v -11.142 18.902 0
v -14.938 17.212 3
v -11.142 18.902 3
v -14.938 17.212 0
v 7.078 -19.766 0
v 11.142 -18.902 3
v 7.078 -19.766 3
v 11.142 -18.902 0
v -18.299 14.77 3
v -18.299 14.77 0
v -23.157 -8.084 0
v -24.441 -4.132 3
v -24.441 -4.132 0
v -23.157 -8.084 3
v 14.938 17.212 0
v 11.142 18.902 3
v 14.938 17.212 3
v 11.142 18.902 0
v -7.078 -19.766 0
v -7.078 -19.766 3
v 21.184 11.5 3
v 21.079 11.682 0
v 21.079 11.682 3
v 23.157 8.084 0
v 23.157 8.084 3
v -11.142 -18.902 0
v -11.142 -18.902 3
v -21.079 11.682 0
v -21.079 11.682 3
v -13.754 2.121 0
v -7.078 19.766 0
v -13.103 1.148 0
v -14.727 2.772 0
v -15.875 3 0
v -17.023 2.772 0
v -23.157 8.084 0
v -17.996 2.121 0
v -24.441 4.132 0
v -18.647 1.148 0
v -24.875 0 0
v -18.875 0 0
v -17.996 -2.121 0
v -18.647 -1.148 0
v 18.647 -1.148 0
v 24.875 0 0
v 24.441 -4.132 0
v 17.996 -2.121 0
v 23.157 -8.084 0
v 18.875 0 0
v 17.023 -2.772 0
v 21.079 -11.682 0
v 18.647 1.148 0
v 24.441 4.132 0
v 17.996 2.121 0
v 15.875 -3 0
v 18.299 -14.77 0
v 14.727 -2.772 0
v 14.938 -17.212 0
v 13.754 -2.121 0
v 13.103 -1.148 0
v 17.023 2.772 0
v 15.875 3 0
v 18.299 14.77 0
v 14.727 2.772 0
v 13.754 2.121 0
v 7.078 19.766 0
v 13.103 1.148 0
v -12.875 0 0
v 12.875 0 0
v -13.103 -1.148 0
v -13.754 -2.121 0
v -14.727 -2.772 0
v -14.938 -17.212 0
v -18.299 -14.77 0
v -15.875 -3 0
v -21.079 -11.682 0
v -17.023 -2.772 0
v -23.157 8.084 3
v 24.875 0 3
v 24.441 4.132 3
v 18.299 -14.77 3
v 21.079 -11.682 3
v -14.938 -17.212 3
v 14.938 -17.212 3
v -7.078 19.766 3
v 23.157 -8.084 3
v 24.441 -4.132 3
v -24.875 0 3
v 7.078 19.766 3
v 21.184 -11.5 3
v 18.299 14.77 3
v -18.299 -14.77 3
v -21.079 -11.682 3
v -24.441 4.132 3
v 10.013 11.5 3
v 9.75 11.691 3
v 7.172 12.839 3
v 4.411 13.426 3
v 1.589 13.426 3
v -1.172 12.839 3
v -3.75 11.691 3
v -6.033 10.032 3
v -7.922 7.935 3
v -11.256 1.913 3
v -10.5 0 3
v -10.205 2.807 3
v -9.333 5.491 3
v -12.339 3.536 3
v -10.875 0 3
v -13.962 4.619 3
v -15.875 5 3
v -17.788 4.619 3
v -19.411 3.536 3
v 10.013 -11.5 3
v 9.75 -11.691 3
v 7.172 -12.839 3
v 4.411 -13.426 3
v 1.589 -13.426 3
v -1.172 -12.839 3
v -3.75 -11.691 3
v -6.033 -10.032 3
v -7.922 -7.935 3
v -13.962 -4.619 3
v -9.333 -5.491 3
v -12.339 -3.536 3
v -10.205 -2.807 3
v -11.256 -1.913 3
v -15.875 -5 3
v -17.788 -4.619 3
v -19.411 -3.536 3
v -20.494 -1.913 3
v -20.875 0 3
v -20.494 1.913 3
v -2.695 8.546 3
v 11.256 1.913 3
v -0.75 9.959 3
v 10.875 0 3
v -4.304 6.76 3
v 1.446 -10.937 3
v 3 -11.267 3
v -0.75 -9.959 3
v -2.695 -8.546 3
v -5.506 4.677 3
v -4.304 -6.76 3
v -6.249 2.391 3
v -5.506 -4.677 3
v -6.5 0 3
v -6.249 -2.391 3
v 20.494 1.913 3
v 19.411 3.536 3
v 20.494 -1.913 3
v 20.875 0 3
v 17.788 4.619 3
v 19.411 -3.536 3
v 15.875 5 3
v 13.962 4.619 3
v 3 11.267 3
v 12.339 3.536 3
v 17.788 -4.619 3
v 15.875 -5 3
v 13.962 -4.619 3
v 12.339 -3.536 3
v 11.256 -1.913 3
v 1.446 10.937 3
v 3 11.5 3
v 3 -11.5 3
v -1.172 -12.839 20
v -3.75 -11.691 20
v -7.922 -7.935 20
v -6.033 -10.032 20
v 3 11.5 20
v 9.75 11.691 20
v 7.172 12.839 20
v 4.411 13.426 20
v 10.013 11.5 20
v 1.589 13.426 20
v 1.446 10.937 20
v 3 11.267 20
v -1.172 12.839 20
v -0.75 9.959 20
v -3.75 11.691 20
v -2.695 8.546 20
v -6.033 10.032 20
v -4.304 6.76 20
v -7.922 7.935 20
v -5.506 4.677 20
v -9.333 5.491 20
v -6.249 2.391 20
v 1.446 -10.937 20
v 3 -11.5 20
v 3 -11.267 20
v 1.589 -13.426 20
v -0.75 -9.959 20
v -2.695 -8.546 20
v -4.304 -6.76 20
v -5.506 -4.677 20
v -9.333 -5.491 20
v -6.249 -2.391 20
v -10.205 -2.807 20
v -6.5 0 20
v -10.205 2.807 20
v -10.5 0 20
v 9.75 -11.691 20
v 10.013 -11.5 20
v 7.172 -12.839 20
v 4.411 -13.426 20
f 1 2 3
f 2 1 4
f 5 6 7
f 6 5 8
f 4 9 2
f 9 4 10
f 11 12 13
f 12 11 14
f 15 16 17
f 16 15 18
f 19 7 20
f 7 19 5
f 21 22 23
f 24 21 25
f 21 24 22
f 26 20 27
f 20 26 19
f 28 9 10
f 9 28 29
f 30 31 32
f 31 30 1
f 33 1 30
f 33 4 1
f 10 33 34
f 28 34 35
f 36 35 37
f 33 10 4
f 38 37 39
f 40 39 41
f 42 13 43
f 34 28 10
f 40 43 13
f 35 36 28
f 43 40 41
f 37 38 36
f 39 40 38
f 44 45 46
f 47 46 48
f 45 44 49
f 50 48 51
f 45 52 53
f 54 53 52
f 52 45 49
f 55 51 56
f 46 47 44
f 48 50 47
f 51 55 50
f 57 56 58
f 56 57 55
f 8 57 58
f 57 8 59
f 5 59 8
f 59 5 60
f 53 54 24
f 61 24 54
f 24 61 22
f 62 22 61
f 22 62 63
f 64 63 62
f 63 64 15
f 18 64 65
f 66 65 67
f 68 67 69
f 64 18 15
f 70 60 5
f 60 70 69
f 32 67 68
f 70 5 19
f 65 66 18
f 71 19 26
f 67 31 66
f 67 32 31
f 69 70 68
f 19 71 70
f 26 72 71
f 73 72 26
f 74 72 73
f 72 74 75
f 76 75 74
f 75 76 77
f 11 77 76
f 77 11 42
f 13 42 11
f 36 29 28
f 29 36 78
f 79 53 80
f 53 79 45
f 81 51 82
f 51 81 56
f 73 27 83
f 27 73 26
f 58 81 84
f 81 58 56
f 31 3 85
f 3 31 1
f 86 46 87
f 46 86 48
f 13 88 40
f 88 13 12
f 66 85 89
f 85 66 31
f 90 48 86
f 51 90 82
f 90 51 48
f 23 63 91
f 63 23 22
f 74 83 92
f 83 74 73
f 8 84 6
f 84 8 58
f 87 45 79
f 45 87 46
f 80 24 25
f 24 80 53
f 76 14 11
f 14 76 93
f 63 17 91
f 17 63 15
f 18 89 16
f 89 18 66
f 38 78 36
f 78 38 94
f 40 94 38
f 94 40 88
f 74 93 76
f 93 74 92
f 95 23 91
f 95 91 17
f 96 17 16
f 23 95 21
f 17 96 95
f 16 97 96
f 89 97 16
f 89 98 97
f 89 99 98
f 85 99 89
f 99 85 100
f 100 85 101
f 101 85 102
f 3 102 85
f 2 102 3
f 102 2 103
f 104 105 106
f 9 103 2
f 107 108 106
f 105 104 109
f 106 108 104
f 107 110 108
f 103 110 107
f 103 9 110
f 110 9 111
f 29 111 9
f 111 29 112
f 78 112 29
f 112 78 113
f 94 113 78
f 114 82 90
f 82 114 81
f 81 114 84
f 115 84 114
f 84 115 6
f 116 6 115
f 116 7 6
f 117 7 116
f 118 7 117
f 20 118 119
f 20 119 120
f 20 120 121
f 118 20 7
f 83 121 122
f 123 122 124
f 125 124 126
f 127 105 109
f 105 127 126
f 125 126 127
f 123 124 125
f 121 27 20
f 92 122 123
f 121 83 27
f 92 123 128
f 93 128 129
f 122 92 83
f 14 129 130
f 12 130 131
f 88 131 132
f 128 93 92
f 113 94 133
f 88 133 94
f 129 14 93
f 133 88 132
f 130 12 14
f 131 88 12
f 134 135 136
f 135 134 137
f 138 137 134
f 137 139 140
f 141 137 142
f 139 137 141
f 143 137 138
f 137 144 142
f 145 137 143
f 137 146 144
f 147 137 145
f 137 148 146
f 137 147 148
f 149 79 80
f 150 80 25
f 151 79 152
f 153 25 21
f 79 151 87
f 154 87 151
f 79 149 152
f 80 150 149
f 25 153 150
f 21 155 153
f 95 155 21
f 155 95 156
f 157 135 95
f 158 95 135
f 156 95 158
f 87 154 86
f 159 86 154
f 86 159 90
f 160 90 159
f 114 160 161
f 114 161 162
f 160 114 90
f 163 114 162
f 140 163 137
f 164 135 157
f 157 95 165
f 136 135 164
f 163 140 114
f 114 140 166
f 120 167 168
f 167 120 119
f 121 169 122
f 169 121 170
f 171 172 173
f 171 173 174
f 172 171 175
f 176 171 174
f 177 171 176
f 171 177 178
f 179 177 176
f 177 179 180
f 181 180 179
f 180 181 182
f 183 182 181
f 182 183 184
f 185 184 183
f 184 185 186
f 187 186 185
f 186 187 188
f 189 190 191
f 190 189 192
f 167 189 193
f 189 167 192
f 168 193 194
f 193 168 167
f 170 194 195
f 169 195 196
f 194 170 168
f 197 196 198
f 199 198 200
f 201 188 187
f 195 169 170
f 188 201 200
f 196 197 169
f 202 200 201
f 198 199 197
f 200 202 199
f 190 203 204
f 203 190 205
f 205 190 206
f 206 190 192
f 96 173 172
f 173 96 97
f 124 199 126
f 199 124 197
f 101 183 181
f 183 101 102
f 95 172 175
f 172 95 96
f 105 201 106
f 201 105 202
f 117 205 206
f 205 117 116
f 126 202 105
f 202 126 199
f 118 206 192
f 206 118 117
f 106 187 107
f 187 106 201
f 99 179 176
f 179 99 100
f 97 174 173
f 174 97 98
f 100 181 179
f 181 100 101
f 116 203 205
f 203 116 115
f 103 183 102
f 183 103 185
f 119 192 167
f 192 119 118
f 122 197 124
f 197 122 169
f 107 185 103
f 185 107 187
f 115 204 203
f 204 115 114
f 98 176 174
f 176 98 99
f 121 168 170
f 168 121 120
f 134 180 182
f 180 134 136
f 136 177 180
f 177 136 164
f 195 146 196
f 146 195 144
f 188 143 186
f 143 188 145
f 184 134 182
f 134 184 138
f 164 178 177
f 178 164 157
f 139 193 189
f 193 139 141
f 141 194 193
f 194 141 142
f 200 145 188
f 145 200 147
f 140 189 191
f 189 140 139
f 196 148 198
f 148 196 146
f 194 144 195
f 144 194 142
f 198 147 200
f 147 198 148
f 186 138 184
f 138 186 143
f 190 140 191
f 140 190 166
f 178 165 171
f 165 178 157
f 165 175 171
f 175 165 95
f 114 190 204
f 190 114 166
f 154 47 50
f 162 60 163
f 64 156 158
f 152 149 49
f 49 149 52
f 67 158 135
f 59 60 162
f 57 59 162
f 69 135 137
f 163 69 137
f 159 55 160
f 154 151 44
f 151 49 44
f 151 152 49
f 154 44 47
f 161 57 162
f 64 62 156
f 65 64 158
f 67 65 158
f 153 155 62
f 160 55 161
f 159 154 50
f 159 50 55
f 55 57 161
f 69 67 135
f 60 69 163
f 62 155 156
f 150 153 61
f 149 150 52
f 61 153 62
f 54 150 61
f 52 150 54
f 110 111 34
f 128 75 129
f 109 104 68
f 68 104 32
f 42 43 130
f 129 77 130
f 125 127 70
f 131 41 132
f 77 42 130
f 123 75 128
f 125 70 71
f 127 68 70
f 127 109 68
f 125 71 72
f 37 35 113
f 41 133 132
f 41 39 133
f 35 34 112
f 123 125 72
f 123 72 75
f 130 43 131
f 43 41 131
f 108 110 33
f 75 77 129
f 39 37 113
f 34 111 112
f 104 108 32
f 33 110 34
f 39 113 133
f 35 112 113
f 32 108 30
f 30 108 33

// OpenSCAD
pipedia=23; //mm ~ 3/4 copper
holespace=1.25*25.4;
margin=4;
thickness=3;
supportlen=20;

module hanger() {
  difference() {
    union() {
      hull(){
        translate([5,0,0]) cylinder(r=holespace/2+margin, h=thickness);
        translate([-5,0,0]) cylinder(r=holespace/2+margin, h=thickness);
      }
      translate([3,0,0]) cylinder(r=pipedia/2+2, h=supportlen);
    }
    translate([5,0,thickness]) cylinder(r=pipedia/2, h=supportlen);
    translate([3,-pipedia/2,thickness]) cube([pipedia,pipedia,supportlen]);

    translate([holespace/2,0,0]) cylinder(r1=3, r2=5, h=thickness);
    translate([-holespace/2,0,0]) cylinder(r1=3, r2=5, h=thickness);
  }
  //  translate([0,-pipedia/2,thickness]) cube([pipedia,pipedia,supportlen]);
}


hanger();
